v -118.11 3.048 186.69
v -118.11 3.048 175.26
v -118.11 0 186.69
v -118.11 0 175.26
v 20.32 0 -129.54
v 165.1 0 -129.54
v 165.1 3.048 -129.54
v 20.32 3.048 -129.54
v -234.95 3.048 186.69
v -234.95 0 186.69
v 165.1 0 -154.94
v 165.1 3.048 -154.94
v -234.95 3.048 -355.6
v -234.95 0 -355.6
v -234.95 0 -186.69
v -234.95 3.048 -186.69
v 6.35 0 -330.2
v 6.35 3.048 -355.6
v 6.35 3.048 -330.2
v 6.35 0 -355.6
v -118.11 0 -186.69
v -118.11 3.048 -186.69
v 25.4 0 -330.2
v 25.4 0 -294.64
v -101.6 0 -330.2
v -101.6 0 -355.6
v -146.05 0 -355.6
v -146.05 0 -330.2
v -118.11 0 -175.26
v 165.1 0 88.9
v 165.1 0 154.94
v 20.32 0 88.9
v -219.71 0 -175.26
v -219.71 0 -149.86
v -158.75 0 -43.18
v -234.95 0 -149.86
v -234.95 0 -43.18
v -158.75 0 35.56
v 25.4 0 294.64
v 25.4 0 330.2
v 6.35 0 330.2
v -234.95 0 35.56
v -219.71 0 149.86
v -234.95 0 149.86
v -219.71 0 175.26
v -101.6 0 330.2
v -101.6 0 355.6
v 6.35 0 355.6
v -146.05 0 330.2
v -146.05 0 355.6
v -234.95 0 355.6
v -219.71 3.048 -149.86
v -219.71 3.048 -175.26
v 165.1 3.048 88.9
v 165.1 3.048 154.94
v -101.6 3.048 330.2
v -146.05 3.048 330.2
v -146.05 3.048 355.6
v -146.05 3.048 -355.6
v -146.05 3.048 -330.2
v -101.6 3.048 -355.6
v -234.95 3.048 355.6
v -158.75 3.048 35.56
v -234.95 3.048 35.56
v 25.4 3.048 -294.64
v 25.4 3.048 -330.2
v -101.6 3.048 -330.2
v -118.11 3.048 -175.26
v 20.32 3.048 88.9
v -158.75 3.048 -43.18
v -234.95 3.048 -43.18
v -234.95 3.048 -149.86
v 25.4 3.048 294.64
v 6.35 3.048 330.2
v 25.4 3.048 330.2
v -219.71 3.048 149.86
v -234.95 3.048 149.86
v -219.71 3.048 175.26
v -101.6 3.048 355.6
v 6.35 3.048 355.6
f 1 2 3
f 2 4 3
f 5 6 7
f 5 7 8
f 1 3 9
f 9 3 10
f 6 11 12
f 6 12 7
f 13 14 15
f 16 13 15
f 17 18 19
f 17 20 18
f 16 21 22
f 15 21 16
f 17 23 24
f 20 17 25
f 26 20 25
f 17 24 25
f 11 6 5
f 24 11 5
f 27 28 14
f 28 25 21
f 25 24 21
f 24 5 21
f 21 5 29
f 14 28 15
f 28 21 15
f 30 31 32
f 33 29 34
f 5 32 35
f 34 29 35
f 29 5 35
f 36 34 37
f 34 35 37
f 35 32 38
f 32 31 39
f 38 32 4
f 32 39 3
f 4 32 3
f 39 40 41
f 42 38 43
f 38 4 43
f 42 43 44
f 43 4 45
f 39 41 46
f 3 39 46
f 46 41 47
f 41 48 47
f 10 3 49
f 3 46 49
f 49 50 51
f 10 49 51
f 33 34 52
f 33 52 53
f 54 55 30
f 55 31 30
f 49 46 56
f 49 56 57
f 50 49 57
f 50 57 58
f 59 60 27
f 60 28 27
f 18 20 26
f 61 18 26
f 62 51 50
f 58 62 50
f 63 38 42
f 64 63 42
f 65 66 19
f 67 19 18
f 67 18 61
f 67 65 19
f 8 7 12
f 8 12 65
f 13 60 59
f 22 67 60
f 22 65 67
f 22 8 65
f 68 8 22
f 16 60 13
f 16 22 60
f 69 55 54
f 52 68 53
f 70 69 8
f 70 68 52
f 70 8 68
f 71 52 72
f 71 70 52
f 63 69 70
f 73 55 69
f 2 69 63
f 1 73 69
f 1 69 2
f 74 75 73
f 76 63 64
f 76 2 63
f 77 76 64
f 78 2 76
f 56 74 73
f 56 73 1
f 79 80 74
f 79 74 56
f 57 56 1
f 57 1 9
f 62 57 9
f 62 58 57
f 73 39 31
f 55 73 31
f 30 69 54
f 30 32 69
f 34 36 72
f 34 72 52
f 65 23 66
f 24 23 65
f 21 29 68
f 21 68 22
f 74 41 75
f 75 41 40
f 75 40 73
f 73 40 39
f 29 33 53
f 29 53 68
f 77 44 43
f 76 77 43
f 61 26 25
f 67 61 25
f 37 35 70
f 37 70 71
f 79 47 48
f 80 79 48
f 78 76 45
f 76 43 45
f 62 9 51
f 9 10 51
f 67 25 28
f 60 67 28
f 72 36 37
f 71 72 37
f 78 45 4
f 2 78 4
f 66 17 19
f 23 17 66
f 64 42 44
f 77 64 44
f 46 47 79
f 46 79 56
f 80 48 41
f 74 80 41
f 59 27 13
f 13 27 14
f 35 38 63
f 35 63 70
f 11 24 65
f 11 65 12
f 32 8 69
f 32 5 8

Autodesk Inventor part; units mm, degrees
ref_plane "YZ Plane" through (0, 0, 0) normal (1, 0, 0) x (0, 1, 0)
ref_plane "XZ Plane" through (0, 0, 0) normal (0, 1, 0) x (-1, 0, 0)
ref_plane "XY Plane" through (0, 0, 0) normal (0, 0, 1) x (1, 0, 0)
sketch "Sketch1" plane through (0, 0, 0) normal (0, 1, 0) x (-1, 0, 0)
  line L0 (234.95, 355.6) -> (-234.95, 355.6)
  line L1 (-234.95, 355.6) -> (-234.95, -355.6)
  line L2 (-234.95, -355.6) -> (234.95, -355.6)
  line L3 (234.95, -355.6) -> (234.95, 355.6)
  line L4 (234.95, 355.6) -> (-234.95, -355.6) construction
  line L5 (-234.95, 355.6) -> (234.95, -355.6) construction
  point P0 (0, 0)
  dimension "d0" = 469.9
  dimension "d1" = 711.2
extrude "Plate1" add sketch "Sketch1" along normal blind 3.048
sketch "Sketch3" plane through (0, 3.048, 0) normal (0, 1, 0) x (1, 0, 0)
  line L0 (234.95, -355.6) -> (-234.95, -355.6) projected
  point P0 (0, 0)
sketch "Sketch4" plane through (0, 0, 0) normal (0, -1, 0) x (1, 0, 0)
  line L0 (-234.95, 355.6) -> (234.95, 355.6) projected
  line L1 (-234.95, -355.6) -> (-234.95, 355.6) projected
  line L2 (234.95, -355.6) -> (-234.95, -355.6) projected
  line L3 (234.95, 355.6) -> (234.95, -355.6) projected
  line L4 (-234.95, 355.6) -> (234.95, 355.6) projected
  line L5 (25.4, 355.6) -> (25.4, 294.64)
  line L6 (165.1, 101.6) -> (234.95, 101.6)
  line L7 (234.95, 355.6) -> (234.95, -355.6) projected
  line L8 (25.4, 294.64) -> (165.1, 154.94)
  line L9 (25.4, 294.64) -> (222.9656, 294.64) construction
  line L10 (165.1, 154.94) -> (165.1, 101.6)
  line L11 (234.95, 0) -> (-234.95, 0)
  line L12 (-234.95, -355.6) -> (-234.95, 355.6) projected
  line L13 (25.4, -355.6) -> (25.4, -294.64)
  line L14 (165.1, -127) -> (234.95, -127)
  line L15 (25.4, -294.64) -> (165.1, -154.94)
  line L16 (25.4, -294.64) -> (222.9656, -294.64) construction
  line L17 (165.1, -154.94) -> (165.1, -127)
  line L18 (-234.95, 184.15) -> (-120.65, 184.15)
  line L19 (-120.65, 184.15) -> (-120.65, 177.8)
  line L20 (-120.65, 177.8) -> (-222.25, 177.8)
  line L21 (-222.25, 177.8) -> (-222.25, 152.4)
  line L22 (-222.25, 152.4) -> (-234.95, 152.4)
  line L23 (-234.95, 149.86) -> (-219.71, 149.86)
  line L24 (-219.71, 149.86) -> (-219.71, 175.26)
  line L25 (-219.71, 175.26) -> (-118.11, 175.26)
  line L26 (-118.11, 175.26) -> (-118.11, 186.69)
  line L27 (-118.11, 186.69) -> (-234.95, 186.69)
  line L28 (165.1, -129.54) -> (20.32, -129.54)
  line L29 (20.32, -129.54) -> (20.32, 88.9)
  line L30 (20.32, 88.9) -> (165.1, 88.9)
  line L31 (165.1, 101.6) -> (165.1, 88.9)
  line L32 (-234.95, -184.15) -> (-120.65, -184.15)
  line L33 (-120.65, -184.15) -> (-120.65, -177.8)
  line L34 (-120.65, -177.8) -> (-222.25, -177.8)
  line L35 (-222.25, -177.8) -> (-222.25, -152.4)
  line L36 (-222.25, -152.4) -> (-234.95, -152.4)
  line L37 (-234.95, -149.86) -> (-219.71, -149.86)
  line L38 (-219.71, -149.86) -> (-219.71, -175.26)
  line L39 (-219.71, -175.26) -> (-118.11, -175.26)
  line L40 (-118.11, -175.26) -> (-118.11, -186.69)
  line L41 (-118.11, -186.69) -> (-234.95, -186.69)
  line L42 (-158.75, 35.56) -> (-158.75, -43.18)
  line L43 (-158.75, -43.18) -> (-234.95, -43.18)
  line L44 (-158.75, 35.56) -> (-234.95, 35.56)
  line L45 (25.4, 330.2) -> (6.35, 330.2)
  line L46 (6.35, 330.2) -> (6.35, 355.6)
  line L47 (25.4, -330.2) -> (6.35, -330.2)
  line L48 (6.35, -330.2) -> (6.35, -355.6)
  line L49 (234.95, -355.6) -> (-234.95, -355.6) projected
  point P0 (0, 0)
  dimension "d3" = 209.55
  dimension "d4" = 254
  dimension "d5" = 45
  dimension "d6" = 60.96
  dimension "d9" = 69.85
  dimension "d12" = 45
  dimension "d13" = 209.55
  dimension "d14" = 228.6
  dimension "d15" = 69.85
  dimension "d16" = 60.96
  dimension "d17" = 171.45
  dimension "d18" = 114.3
  dimension "d19" = 6.35
  dimension "d21" = 101.6
  dimension "d22" = 25.4
  dimension "d23" = 2.54
  dimension "d26" = 144.78
  dimension "d31" = 12.7
  dimension "d32" = 114.3
  dimension "d33" = 171.45
  dimension "d34" = 6.35
  dimension "d35" = 101.6
  dimension "d36" = 25.4
  dimension "d37" = 2.54
  dimension "d38" = 76.2
  dimension "d39" = 35.56
  dimension "d40" = 43.18
  dimension "d41" = 2.54
  dimension "d42" = 25.4
  dimension "d43" = 19.05
  dimension "d44" = 25.4
  dimension "d45" = 19.05
extrude "Cut1" cut sketch "Sketch4" against normal blind 3.048 contours L27 L26 L25 L24 L23 L1 L22 L21 L20 L19 L18 | L0 L3 L6 L10 L8 L5 | L18 L19 L20 L21 L22 L1 | L3 L11 L29 L30 L31 L6 | L3 L14 L17 L28 L29 L11 | L44 L42 L11 L1 | L3 L2 L13 L15 L17 L14 | L11 L42 L43 L1 | L37 L38 L39 L40 L41 L1 L32 L33 L34 L35 L36 | L36 L35 L34 L33 L32 L1
sketch "Sketch5" plane through (0, 0, 0) normal (0, -1, 0) x (1, 0, 0)
  line L0 (25.4, 355.6) -> (25.4, 294.64) projected
  line L1 (25.4, 294.64) -> (165.1, 154.94) projected
  line L2 (165.1, 154.94) -> (165.1, 88.9) projected
  line L3 (165.1, 88.9) -> (20.32, 88.9) projected
  line L4 (20.32, 88.9) -> (20.32, -129.54) projected
  line L5 (20.32, -129.54) -> (165.1, -129.54) projected
  line L6 (165.1, -129.54) -> (165.1, -154.94) projected
  line L7 (165.1, -154.94) -> (25.4, -294.64) projected
  line L8 (25.4, -294.64) -> (25.4, -355.6) projected
  line L9 (25.4, -355.6) -> (-234.95, -355.6) projected
  line L10 (-234.95, -355.6) -> (-234.95, -186.69) projected
  line L11 (-234.95, -186.69) -> (-118.11, -186.69) projected
  line L12 (-118.11, -186.69) -> (-118.11, -175.26) projected
  line L13 (-118.11, -175.26) -> (-219.71, -175.26) projected
  line L14 (-219.71, -175.26) -> (-219.71, -149.86) projected
  line L15 (-219.71, -149.86) -> (-234.95, -149.86) projected
  line L16 (-234.95, -149.86) -> (-234.95, -43.18) projected
  line L17 (-234.95, -43.18) -> (-158.75, -43.18) projected
  line L18 (-158.75, -43.18) -> (-158.75, 35.56) projected
  line L19 (-158.75, 35.56) -> (-234.95, 35.56) projected
  line L20 (-234.95, 35.56) -> (-234.95, 149.86) projected
  line L21 (-234.95, 149.86) -> (-219.71, 149.86) projected
  line L22 (-219.71, 149.86) -> (-219.71, 175.26) projected
  line L23 (-219.71, 175.26) -> (-118.11, 175.26) projected
  line L24 (-118.11, 175.26) -> (-118.11, 186.69) projected
  line L25 (-118.11, 186.69) -> (-234.95, 186.69) projected
  line L26 (-234.95, 186.69) -> (-234.95, 355.6) projected
  line L27 (-234.95, 355.6) -> (25.4, 355.6) projected
  line L28 (25.4, -355.6) -> (-234.95, -355.6) projected
  line L29 (25.4, -355.6) -> (6.35, -355.6)
  line L30 (6.35, -355.6) -> (6.35, -330.2)
  line L31 (6.35, -330.2) -> (25.4, -330.2)
  line L32 (25.4, -330.2) -> (25.4, -355.6)
  line L33 (-234.95, 355.6) -> (25.4, 355.6) projected
  line L34 (25.4, 355.6) -> (6.35, 355.6)
  line L35 (6.35, 355.6) -> (6.35, 330.2)
  line L36 (6.35, 330.2) -> (25.4, 330.2)
  line L37 (25.4, 330.2) -> (25.4, 355.6)
  line L38 (-146.05, -355.6) -> (-101.6, -355.6)
  line L39 (-101.6, -355.6) -> (-101.6, -330.2)
  line L40 (-101.6, -330.2) -> (-146.05, -330.2)
  line L41 (-146.05, -330.2) -> (-146.05, -355.6)
  line L42 (-146.05, 355.6) -> (-101.6, 355.6)
  line L43 (-101.6, 355.6) -> (-101.6, 330.2)
  line L44 (-101.6, 330.2) -> (-146.05, 330.2)
  line L45 (-146.05, 330.2) -> (-146.05, 355.6)
  point P0 (0, 0)
  dimension "d46" = 19.05
  dimension "d47" = 25.4
  dimension "d48" = 19.05
  dimension "d49" = 25.4
  dimension "d52" = 44.45
  dimension "d53" = 25.4
  dimension "d54" = 88.9
  dimension "d55" = 44.45
  dimension "d56" = 25.4
  dimension "d57" = 88.9
extrude "Cut2" cut sketch "Sketch5" against normal blind 3.048 contours L0 L36 L35 L27 | L43 L44 L45 L27 | L8 L9 L30 L31 | L9 L41 L40 L39
equation "\"d10\" = Thickness"
equation "\"d2\" = Thickness"
equation "\"BendRadius\" = Thickness"
equation "\"BendReliefWidth\" = Thickness"
equation "\"BendReliefDepth\" = 0.5 * Thickness"
equation "\"CornerReliefSize\" = 4 * Thickness"
equation "\"MinimumRemnant\" = 2 * Thickness"
equation "\"TransitionRadius\" = BendRadius"
equation "\"JacobiRadiusSize\" = BendRadius"
equation "\"GapSize\" = Thickness"
equation "\"Thickness\" = 3.048"
properties part number "DB1-015" material "Polycarbonate, Smoke"
